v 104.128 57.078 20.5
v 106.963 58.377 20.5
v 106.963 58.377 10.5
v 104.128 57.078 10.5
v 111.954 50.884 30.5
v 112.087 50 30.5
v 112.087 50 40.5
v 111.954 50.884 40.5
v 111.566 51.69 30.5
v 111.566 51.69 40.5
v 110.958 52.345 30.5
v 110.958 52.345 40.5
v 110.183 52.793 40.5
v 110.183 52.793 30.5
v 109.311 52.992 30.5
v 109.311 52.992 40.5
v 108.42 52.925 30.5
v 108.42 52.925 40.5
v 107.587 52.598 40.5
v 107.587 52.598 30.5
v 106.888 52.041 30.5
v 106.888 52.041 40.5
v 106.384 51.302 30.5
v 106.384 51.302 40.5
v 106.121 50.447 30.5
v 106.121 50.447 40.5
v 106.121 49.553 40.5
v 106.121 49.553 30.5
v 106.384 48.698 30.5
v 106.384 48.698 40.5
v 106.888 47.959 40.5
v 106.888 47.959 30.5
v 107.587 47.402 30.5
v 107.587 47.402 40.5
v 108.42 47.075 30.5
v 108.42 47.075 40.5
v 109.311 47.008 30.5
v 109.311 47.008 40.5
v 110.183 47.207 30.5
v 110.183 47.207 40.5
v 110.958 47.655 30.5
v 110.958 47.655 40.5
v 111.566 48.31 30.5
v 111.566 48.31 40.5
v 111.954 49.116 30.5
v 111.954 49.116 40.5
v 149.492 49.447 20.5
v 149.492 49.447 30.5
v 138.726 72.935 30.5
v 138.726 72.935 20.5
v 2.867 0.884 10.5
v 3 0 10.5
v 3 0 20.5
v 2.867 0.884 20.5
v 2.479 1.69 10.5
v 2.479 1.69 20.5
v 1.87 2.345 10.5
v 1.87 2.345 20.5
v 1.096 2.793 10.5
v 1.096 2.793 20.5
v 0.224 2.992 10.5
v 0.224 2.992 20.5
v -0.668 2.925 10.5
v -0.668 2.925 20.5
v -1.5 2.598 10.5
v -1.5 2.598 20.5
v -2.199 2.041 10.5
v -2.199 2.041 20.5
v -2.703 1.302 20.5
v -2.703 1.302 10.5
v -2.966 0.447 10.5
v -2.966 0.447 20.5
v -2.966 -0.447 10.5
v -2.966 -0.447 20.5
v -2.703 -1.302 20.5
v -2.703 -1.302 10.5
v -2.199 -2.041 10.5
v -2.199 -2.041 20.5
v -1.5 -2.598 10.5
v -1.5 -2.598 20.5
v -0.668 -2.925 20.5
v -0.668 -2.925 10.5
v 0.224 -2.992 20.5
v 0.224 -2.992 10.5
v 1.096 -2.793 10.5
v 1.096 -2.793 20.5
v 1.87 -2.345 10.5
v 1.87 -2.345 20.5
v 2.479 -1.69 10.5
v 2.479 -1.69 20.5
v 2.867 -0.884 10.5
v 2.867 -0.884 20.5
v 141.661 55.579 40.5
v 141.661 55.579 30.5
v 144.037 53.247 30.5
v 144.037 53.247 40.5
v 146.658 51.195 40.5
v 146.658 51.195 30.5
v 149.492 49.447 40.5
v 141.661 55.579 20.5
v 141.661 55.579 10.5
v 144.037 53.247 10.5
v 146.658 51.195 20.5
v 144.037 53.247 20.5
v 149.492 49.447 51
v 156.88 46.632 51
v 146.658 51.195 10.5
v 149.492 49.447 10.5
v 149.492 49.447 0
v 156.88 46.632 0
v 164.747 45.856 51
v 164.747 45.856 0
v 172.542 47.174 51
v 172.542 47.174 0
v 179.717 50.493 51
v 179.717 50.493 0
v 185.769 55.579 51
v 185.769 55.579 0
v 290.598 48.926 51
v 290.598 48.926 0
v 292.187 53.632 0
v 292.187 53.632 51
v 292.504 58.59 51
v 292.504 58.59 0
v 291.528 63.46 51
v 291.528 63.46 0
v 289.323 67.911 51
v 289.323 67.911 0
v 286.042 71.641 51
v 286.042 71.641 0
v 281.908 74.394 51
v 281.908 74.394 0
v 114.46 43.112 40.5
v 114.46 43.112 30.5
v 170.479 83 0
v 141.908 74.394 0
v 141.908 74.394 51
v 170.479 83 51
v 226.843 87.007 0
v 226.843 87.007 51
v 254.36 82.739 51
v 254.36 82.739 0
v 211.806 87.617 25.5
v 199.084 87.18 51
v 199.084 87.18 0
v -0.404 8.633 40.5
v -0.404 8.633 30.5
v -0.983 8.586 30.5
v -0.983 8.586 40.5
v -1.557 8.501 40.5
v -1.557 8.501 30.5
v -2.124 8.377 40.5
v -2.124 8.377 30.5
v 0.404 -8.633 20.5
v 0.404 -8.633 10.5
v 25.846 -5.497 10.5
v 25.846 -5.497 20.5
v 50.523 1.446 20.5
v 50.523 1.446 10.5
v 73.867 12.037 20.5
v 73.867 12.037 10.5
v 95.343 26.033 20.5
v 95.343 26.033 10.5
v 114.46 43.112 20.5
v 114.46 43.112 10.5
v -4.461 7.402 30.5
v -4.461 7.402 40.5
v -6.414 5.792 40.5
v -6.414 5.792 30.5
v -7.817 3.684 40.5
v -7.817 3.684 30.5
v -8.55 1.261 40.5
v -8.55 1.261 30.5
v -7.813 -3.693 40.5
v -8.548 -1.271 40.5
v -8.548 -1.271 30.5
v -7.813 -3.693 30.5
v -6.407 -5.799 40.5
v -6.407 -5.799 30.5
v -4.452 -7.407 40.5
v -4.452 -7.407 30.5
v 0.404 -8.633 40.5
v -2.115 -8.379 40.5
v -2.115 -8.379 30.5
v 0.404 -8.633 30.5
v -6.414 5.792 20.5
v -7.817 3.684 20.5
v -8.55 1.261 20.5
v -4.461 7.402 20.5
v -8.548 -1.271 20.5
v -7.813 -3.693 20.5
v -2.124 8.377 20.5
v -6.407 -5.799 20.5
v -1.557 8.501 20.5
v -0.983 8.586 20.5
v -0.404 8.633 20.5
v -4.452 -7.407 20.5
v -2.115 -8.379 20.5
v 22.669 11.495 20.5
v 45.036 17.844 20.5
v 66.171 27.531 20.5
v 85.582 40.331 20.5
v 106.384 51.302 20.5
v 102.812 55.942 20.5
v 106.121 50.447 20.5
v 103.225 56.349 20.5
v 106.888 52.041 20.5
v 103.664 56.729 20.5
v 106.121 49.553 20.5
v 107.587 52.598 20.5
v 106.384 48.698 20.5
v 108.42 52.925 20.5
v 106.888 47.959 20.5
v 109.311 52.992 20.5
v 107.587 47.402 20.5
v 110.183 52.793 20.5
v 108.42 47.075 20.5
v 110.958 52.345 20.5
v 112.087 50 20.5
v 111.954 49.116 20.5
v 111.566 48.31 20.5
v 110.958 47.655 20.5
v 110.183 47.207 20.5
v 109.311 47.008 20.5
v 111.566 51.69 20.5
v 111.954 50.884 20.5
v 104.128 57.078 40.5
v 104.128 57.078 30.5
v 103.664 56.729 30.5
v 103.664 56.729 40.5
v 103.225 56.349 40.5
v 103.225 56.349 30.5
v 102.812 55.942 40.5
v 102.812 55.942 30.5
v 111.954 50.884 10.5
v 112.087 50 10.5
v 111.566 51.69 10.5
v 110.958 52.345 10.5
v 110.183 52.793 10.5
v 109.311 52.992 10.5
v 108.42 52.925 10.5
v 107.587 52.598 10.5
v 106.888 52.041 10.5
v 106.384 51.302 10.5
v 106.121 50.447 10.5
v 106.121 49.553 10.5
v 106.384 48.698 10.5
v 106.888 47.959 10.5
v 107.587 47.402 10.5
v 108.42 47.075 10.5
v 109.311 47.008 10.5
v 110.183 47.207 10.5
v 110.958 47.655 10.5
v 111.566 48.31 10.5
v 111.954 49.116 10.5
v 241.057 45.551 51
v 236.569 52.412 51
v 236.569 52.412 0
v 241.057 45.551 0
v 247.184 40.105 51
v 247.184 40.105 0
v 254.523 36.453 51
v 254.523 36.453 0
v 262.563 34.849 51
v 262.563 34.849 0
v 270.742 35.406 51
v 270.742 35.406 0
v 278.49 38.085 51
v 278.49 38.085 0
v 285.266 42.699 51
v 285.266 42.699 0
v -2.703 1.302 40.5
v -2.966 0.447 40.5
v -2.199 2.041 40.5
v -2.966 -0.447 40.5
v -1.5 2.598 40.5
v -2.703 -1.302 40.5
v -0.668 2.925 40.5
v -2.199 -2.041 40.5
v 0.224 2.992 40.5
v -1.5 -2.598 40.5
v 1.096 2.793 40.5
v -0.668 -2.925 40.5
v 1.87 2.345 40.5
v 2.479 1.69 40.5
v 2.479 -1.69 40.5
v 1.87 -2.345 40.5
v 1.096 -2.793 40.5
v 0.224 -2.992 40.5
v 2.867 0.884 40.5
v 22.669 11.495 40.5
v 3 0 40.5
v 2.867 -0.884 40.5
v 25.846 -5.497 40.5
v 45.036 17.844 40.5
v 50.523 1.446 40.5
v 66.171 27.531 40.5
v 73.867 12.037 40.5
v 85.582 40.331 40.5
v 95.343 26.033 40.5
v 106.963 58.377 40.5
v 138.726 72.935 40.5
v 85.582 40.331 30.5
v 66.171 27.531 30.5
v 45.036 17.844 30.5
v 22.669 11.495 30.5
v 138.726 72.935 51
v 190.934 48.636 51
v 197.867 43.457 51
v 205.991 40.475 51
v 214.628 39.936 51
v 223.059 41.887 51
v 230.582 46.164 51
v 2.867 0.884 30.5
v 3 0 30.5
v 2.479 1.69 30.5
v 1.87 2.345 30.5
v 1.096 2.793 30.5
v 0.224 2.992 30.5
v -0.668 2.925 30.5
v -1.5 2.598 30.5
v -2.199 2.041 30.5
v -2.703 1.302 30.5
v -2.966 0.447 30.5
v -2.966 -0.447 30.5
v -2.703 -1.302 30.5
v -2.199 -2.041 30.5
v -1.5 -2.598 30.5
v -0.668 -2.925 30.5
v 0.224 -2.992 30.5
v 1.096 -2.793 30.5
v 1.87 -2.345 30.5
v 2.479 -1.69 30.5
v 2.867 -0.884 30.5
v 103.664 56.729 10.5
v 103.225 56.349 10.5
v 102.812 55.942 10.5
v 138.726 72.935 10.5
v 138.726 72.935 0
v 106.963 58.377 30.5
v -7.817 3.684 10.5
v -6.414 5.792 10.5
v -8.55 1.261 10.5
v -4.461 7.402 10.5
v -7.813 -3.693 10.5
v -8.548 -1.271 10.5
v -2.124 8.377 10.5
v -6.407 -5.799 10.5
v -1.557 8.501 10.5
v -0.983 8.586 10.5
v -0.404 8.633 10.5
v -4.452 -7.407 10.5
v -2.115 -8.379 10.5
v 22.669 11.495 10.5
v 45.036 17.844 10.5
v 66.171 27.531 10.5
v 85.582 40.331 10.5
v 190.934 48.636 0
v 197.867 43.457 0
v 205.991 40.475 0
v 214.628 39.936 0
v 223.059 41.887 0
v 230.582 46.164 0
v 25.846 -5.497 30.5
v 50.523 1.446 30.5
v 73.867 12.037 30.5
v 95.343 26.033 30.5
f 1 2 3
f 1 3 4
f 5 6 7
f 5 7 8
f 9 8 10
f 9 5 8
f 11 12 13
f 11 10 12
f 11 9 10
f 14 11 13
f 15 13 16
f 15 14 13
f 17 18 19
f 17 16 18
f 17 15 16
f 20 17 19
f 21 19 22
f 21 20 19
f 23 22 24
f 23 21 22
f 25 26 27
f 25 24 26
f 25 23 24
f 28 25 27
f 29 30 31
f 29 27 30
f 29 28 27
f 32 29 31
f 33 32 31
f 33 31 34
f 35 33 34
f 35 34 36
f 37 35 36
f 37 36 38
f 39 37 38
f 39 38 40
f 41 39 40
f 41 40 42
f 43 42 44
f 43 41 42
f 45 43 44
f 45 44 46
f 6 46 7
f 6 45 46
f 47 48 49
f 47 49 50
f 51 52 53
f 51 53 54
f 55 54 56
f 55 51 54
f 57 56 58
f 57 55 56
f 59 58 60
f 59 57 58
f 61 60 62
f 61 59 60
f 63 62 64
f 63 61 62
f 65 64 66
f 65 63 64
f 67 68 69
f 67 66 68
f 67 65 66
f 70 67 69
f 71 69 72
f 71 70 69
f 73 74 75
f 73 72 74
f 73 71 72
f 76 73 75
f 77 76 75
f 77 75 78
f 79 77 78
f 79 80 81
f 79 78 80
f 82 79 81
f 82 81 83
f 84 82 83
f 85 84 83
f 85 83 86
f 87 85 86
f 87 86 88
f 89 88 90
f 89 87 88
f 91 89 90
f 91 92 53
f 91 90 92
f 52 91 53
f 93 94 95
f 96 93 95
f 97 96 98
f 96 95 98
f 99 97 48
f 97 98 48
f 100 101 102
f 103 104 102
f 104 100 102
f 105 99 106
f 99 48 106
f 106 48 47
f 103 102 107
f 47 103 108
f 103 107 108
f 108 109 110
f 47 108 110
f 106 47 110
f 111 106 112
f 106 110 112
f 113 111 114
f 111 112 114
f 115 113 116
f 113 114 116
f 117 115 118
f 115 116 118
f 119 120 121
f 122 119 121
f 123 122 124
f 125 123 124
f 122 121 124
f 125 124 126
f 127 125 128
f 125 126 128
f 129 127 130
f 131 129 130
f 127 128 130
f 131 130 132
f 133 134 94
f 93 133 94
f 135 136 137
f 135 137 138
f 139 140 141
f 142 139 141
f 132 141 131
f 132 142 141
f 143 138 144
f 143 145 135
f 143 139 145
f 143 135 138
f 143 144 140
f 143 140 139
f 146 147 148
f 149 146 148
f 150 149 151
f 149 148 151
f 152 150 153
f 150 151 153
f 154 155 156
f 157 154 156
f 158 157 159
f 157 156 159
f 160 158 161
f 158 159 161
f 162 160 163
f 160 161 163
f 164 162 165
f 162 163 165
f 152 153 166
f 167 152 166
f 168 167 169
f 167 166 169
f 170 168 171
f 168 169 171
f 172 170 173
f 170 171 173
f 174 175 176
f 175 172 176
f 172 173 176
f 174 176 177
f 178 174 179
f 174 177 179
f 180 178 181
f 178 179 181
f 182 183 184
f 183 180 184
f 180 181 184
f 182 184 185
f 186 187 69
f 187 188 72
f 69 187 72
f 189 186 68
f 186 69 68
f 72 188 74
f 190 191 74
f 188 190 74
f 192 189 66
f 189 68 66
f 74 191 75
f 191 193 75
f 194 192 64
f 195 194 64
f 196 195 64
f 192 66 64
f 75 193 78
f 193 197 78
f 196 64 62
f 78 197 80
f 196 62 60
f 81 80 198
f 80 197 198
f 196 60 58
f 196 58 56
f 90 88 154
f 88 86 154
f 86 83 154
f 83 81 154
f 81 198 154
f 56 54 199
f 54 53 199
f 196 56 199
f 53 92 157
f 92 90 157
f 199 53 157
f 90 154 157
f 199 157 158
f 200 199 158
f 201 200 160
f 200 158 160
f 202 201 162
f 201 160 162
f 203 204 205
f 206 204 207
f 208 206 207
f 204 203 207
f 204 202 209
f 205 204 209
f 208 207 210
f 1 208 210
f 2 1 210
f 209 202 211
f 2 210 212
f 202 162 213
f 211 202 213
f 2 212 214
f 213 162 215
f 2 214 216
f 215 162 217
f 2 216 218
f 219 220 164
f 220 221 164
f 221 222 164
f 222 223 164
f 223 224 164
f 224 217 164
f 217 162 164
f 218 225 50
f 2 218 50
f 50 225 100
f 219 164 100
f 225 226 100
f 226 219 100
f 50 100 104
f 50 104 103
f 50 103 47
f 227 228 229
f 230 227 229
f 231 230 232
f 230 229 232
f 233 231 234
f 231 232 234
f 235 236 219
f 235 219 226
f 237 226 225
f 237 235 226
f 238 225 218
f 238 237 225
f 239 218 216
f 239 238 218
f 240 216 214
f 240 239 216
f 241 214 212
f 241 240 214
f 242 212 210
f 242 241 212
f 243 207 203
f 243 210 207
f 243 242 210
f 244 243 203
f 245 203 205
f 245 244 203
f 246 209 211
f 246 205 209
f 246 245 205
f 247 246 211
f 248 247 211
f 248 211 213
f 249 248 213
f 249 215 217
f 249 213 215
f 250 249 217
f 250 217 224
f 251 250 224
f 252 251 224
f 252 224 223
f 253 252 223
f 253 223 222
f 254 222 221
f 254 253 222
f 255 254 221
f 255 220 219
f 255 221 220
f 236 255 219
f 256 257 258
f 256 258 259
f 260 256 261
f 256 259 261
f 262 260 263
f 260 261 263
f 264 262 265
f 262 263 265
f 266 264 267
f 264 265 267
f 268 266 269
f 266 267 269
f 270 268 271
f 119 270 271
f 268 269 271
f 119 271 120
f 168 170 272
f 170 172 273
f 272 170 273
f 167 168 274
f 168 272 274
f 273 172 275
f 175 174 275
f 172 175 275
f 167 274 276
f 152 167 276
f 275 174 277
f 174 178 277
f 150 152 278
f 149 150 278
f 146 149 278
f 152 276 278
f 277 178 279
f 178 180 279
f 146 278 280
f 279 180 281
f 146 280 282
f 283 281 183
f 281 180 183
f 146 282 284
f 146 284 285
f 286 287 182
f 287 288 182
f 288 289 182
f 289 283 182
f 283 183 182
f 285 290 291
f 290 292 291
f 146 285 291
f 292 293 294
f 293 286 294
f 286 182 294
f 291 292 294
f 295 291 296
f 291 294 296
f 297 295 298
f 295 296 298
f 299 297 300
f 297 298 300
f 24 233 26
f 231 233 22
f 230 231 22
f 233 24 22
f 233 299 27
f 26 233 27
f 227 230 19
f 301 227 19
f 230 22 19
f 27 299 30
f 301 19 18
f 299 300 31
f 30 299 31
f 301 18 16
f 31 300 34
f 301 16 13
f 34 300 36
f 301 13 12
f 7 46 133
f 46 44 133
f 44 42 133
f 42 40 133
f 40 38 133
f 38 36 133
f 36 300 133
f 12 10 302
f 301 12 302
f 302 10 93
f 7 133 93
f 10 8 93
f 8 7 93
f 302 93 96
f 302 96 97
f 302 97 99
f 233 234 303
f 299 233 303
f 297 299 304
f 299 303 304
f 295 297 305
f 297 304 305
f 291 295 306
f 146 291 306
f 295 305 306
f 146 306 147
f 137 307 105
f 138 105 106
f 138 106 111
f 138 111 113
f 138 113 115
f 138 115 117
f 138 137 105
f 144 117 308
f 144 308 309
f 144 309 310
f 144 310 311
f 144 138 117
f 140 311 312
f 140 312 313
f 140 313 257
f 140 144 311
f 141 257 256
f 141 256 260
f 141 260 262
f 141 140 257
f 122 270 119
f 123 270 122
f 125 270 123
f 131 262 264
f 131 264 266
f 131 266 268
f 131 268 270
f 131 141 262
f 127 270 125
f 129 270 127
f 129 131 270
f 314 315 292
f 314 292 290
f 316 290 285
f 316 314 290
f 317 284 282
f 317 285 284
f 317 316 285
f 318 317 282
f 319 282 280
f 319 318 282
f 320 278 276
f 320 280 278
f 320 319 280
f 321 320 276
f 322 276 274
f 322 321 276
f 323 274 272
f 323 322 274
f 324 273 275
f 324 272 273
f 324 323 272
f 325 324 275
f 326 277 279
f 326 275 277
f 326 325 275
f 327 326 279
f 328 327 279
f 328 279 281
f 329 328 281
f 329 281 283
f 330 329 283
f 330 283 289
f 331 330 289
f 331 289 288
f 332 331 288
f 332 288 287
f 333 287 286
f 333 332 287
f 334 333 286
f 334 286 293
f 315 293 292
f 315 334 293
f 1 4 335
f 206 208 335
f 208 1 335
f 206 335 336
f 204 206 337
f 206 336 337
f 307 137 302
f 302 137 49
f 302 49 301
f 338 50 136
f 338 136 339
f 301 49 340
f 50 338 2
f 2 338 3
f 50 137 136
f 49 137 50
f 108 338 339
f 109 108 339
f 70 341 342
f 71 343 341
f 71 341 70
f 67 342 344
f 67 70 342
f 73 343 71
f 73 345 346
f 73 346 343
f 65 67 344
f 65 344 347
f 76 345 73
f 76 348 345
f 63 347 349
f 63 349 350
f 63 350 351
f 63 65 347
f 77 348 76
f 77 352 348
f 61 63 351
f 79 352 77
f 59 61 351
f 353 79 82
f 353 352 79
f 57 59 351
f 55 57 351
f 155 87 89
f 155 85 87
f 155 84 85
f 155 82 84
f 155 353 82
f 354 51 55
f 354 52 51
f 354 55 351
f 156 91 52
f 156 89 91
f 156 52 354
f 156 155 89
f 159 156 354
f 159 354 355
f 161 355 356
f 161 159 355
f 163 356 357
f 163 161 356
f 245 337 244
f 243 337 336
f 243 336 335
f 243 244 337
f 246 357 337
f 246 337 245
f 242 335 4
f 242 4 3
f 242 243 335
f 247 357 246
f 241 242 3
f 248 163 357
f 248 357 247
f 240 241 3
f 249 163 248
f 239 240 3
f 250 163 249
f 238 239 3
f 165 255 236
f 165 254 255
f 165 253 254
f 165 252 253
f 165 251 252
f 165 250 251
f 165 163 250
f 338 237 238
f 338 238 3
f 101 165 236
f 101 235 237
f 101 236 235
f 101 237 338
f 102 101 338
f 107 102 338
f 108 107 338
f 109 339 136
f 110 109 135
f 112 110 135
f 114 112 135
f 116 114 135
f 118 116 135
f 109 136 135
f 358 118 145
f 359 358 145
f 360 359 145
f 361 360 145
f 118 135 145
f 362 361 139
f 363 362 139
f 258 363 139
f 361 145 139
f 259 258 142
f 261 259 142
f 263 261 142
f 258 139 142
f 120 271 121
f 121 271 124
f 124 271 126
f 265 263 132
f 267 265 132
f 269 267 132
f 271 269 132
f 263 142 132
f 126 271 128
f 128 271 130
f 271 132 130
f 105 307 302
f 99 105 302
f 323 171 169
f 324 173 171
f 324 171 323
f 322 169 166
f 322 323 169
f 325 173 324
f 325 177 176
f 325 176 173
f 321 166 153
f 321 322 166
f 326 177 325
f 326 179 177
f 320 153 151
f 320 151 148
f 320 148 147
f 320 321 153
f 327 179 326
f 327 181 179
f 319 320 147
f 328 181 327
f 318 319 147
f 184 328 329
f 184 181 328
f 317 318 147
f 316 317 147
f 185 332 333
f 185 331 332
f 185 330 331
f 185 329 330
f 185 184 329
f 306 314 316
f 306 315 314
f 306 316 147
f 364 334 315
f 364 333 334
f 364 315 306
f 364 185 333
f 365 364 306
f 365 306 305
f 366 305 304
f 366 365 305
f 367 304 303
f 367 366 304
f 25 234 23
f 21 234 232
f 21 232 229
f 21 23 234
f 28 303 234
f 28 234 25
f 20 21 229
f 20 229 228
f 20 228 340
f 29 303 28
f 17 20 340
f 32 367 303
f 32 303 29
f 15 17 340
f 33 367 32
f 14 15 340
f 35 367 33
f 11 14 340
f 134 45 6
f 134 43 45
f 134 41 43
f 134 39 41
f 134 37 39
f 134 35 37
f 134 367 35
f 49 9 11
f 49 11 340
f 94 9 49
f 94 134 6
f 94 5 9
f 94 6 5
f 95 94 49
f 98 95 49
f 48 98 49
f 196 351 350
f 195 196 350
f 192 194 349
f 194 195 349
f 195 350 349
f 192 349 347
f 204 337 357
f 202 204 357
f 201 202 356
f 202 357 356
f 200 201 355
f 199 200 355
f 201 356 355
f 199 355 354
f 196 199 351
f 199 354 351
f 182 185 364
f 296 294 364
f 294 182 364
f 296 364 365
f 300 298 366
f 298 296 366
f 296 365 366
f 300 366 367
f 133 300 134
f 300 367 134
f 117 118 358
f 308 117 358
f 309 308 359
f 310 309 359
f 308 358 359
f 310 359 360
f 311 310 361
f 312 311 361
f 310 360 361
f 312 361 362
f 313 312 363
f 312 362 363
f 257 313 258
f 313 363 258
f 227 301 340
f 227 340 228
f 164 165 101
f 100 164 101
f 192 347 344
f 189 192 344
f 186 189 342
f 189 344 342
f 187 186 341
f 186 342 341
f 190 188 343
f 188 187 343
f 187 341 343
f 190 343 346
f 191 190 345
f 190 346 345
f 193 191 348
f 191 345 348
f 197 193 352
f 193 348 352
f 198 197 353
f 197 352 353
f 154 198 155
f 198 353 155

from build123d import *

# Parameters (mm, degrees)
CROQUIS1_R                 = 3
SALIENTE_EXTRUIR1_DEPTH    = 51
CORTAR_EXTRUIR1_DEPTH      = 311.888957589
CORTAR_EXTRUIR1_DEPTH_BACK = 311.888957589
CROQUIS2_W                 = 181.964548074
CROQUIS2_H                 = 27.905532643
CROQUIS2_W_2               = 174.878216902
CROQUIS2_H_2               = 60.347618799
CROQUIS2_W_3               = 330
CROQUIS2_H_3               = 10


with BuildPart() as part:
    # Croquis1 → Saliente-Extruir1 (new body)
    # profile 1 of 4: a face of its own
    with BuildSketch(Plane.XY):
        with BuildLine():
            Line((141.907724078, 74.393898239), (106.962723162, 58.37688333))
            ThreePointArc((106.962723162, 58.37688333), (116.54115135, 54.372948072), (115.362717192, 44.058439988))
            ThreePointArc((115.362717192, 44.058439988), (114.912044927, 43.584270047), (114.45954291, 43.111845929))
            Line((114.45954291, 43.111845929), (141.660745717, 55.579496794))
            ThreePointArc((141.660745717, 55.579496794), (163.715018222, 45.838294791), (185.769290727, 55.579496794))
            ThreePointArc((185.769290727, 55.579496794), (210.289811625, 39.891989826), (236.56917478, 52.411929606))
            ThreePointArc((236.56917478, 52.411929606), (262.563049751, 34.849044969), (290.598242925, 48.926132611))
            ThreePointArc((290.598242925, 48.926132611), (291.527530464, 63.45988081), (281.907724078, 74.393898239))
            add(Edge.make_bspline(
                [(141.907724078, 74.393898239), (211.705167047, 100.839206128), (281.907724078, 74.393898239)],
                knots=[0, 0, 0, 1, 1, 1], degree=2))
        make_face()
    # profile 2 of 4: a face of its own
    with BuildSketch(Plane.XY):
        with BuildLine():
            ThreePointArc((105.545350362, 57.727231572), (116.814352718, 53.541770784), (112.62889193, 42.272768428))
            Line((112.62889193, 42.272768428), (114.45954291, 43.111845929))
            ThreePointArc((114.45954291, 43.111845929), (114.912044927, 43.584270047), (115.362717192, 44.058439988))
            ThreePointArc((115.362717192, 44.058439988), (116.54115135, 54.372948072), (106.962723162, 58.37688333))
            Line((106.962723162, 58.37688333), (105.545350362, 57.727231572))
        make_face()
    # profile 3 of 4: a face of its own
    with BuildSketch(Plane.XY):
        with BuildLine():
            Line((-2.124397984, 8.37688333), (-3.541770784, 7.727231572))
            ThreePointArc((-3.541770784, 7.727231572), (-7.727231572, -3.541770784), (3.541770784, -7.727231572))
            Line((3.541770784, -7.727231572), (112.62889193, 42.272768428))
            ThreePointArc((112.62889193, 42.272768428), (116.814352718, 53.541770784), (105.545350362, 57.727231572))
            Line((105.545350362, 57.727231572), (104.127977562, 57.077579814))
            ThreePointArc((104.127977562, 57.077579814), (103.441106721, 56.542764112), (102.8115251, 55.941560012))
            ThreePointArc((102.8115251, 55.941560012), (55.789043947, 22.282676087), (-0.404455893, 8.63259269))
            ThreePointArc((-0.404455893, 8.63259269), (-1.270874621, 8.548106154), (-2.124397984, 8.37688333))
        make_face()
        Circle(CROQUIS1_R, mode=Mode.SUBTRACT)
        with Locations((109.087121146, 50)):
            Circle(CROQUIS1_R, mode=Mode.SUBTRACT)
    # profile 4 of 4: a face of its own
    with BuildSketch(Plane.XY):
        with BuildLine():
            ThreePointArc((3.541770784, -7.727231572), (-7.727231572, -3.541770784), (-3.541770784, 7.727231572))
            Line((-3.541770784, 7.727231572), (-2.124397984, 8.37688333))
            ThreePointArc((-2.124397984, 8.37688333), (-8.548106154, -1.270874621), (0.404455893, -8.63259269))
            ThreePointArc((0.404455893, -8.63259269), (62.395554487, 6.298958939), (114.45954291, 43.111845929))
            Line((114.45954291, 43.111845929), (112.62889193, 42.272768428))
            Line((112.62889193, 42.272768428), (3.541770784, -7.727231572))
        make_face()
    extrude(amount=SALIENTE_EXTRUIR1_DEPTH)

    # Croquis2 → Cortar-Extruir1 (cut, two sides: drawn at the far end of the back side and taken through both)
    with BuildSketch(Plane(origin=(-3.541770784, 7.727231572, 0), x_dir=(0.9090593428863096, 0.4166666666666667, 0), z_dir=(-0.41666666666666663, 0.9090593428863095, 0)).offset(-CORTAR_EXTRUIR1_DEPTH_BACK)):
        with Locations((65.517476081, 3.452766322)):
            Rectangle(CROQUIS2_W, CROQUIS2_H)
        with Locations((69.060641667, -70.6738094)):
            Rectangle(CROQUIS2_W_2, CROQUIS2_H_2)
        with Locations((-8.500249882, -25.5)):
            Rectangle(CROQUIS2_W_3, CROQUIS2_H_3)
    extrude(amount=CORTAR_EXTRUIR1_DEPTH + CORTAR_EXTRUIR1_DEPTH_BACK, mode=Mode.SUBTRACT)


solid = part.part
